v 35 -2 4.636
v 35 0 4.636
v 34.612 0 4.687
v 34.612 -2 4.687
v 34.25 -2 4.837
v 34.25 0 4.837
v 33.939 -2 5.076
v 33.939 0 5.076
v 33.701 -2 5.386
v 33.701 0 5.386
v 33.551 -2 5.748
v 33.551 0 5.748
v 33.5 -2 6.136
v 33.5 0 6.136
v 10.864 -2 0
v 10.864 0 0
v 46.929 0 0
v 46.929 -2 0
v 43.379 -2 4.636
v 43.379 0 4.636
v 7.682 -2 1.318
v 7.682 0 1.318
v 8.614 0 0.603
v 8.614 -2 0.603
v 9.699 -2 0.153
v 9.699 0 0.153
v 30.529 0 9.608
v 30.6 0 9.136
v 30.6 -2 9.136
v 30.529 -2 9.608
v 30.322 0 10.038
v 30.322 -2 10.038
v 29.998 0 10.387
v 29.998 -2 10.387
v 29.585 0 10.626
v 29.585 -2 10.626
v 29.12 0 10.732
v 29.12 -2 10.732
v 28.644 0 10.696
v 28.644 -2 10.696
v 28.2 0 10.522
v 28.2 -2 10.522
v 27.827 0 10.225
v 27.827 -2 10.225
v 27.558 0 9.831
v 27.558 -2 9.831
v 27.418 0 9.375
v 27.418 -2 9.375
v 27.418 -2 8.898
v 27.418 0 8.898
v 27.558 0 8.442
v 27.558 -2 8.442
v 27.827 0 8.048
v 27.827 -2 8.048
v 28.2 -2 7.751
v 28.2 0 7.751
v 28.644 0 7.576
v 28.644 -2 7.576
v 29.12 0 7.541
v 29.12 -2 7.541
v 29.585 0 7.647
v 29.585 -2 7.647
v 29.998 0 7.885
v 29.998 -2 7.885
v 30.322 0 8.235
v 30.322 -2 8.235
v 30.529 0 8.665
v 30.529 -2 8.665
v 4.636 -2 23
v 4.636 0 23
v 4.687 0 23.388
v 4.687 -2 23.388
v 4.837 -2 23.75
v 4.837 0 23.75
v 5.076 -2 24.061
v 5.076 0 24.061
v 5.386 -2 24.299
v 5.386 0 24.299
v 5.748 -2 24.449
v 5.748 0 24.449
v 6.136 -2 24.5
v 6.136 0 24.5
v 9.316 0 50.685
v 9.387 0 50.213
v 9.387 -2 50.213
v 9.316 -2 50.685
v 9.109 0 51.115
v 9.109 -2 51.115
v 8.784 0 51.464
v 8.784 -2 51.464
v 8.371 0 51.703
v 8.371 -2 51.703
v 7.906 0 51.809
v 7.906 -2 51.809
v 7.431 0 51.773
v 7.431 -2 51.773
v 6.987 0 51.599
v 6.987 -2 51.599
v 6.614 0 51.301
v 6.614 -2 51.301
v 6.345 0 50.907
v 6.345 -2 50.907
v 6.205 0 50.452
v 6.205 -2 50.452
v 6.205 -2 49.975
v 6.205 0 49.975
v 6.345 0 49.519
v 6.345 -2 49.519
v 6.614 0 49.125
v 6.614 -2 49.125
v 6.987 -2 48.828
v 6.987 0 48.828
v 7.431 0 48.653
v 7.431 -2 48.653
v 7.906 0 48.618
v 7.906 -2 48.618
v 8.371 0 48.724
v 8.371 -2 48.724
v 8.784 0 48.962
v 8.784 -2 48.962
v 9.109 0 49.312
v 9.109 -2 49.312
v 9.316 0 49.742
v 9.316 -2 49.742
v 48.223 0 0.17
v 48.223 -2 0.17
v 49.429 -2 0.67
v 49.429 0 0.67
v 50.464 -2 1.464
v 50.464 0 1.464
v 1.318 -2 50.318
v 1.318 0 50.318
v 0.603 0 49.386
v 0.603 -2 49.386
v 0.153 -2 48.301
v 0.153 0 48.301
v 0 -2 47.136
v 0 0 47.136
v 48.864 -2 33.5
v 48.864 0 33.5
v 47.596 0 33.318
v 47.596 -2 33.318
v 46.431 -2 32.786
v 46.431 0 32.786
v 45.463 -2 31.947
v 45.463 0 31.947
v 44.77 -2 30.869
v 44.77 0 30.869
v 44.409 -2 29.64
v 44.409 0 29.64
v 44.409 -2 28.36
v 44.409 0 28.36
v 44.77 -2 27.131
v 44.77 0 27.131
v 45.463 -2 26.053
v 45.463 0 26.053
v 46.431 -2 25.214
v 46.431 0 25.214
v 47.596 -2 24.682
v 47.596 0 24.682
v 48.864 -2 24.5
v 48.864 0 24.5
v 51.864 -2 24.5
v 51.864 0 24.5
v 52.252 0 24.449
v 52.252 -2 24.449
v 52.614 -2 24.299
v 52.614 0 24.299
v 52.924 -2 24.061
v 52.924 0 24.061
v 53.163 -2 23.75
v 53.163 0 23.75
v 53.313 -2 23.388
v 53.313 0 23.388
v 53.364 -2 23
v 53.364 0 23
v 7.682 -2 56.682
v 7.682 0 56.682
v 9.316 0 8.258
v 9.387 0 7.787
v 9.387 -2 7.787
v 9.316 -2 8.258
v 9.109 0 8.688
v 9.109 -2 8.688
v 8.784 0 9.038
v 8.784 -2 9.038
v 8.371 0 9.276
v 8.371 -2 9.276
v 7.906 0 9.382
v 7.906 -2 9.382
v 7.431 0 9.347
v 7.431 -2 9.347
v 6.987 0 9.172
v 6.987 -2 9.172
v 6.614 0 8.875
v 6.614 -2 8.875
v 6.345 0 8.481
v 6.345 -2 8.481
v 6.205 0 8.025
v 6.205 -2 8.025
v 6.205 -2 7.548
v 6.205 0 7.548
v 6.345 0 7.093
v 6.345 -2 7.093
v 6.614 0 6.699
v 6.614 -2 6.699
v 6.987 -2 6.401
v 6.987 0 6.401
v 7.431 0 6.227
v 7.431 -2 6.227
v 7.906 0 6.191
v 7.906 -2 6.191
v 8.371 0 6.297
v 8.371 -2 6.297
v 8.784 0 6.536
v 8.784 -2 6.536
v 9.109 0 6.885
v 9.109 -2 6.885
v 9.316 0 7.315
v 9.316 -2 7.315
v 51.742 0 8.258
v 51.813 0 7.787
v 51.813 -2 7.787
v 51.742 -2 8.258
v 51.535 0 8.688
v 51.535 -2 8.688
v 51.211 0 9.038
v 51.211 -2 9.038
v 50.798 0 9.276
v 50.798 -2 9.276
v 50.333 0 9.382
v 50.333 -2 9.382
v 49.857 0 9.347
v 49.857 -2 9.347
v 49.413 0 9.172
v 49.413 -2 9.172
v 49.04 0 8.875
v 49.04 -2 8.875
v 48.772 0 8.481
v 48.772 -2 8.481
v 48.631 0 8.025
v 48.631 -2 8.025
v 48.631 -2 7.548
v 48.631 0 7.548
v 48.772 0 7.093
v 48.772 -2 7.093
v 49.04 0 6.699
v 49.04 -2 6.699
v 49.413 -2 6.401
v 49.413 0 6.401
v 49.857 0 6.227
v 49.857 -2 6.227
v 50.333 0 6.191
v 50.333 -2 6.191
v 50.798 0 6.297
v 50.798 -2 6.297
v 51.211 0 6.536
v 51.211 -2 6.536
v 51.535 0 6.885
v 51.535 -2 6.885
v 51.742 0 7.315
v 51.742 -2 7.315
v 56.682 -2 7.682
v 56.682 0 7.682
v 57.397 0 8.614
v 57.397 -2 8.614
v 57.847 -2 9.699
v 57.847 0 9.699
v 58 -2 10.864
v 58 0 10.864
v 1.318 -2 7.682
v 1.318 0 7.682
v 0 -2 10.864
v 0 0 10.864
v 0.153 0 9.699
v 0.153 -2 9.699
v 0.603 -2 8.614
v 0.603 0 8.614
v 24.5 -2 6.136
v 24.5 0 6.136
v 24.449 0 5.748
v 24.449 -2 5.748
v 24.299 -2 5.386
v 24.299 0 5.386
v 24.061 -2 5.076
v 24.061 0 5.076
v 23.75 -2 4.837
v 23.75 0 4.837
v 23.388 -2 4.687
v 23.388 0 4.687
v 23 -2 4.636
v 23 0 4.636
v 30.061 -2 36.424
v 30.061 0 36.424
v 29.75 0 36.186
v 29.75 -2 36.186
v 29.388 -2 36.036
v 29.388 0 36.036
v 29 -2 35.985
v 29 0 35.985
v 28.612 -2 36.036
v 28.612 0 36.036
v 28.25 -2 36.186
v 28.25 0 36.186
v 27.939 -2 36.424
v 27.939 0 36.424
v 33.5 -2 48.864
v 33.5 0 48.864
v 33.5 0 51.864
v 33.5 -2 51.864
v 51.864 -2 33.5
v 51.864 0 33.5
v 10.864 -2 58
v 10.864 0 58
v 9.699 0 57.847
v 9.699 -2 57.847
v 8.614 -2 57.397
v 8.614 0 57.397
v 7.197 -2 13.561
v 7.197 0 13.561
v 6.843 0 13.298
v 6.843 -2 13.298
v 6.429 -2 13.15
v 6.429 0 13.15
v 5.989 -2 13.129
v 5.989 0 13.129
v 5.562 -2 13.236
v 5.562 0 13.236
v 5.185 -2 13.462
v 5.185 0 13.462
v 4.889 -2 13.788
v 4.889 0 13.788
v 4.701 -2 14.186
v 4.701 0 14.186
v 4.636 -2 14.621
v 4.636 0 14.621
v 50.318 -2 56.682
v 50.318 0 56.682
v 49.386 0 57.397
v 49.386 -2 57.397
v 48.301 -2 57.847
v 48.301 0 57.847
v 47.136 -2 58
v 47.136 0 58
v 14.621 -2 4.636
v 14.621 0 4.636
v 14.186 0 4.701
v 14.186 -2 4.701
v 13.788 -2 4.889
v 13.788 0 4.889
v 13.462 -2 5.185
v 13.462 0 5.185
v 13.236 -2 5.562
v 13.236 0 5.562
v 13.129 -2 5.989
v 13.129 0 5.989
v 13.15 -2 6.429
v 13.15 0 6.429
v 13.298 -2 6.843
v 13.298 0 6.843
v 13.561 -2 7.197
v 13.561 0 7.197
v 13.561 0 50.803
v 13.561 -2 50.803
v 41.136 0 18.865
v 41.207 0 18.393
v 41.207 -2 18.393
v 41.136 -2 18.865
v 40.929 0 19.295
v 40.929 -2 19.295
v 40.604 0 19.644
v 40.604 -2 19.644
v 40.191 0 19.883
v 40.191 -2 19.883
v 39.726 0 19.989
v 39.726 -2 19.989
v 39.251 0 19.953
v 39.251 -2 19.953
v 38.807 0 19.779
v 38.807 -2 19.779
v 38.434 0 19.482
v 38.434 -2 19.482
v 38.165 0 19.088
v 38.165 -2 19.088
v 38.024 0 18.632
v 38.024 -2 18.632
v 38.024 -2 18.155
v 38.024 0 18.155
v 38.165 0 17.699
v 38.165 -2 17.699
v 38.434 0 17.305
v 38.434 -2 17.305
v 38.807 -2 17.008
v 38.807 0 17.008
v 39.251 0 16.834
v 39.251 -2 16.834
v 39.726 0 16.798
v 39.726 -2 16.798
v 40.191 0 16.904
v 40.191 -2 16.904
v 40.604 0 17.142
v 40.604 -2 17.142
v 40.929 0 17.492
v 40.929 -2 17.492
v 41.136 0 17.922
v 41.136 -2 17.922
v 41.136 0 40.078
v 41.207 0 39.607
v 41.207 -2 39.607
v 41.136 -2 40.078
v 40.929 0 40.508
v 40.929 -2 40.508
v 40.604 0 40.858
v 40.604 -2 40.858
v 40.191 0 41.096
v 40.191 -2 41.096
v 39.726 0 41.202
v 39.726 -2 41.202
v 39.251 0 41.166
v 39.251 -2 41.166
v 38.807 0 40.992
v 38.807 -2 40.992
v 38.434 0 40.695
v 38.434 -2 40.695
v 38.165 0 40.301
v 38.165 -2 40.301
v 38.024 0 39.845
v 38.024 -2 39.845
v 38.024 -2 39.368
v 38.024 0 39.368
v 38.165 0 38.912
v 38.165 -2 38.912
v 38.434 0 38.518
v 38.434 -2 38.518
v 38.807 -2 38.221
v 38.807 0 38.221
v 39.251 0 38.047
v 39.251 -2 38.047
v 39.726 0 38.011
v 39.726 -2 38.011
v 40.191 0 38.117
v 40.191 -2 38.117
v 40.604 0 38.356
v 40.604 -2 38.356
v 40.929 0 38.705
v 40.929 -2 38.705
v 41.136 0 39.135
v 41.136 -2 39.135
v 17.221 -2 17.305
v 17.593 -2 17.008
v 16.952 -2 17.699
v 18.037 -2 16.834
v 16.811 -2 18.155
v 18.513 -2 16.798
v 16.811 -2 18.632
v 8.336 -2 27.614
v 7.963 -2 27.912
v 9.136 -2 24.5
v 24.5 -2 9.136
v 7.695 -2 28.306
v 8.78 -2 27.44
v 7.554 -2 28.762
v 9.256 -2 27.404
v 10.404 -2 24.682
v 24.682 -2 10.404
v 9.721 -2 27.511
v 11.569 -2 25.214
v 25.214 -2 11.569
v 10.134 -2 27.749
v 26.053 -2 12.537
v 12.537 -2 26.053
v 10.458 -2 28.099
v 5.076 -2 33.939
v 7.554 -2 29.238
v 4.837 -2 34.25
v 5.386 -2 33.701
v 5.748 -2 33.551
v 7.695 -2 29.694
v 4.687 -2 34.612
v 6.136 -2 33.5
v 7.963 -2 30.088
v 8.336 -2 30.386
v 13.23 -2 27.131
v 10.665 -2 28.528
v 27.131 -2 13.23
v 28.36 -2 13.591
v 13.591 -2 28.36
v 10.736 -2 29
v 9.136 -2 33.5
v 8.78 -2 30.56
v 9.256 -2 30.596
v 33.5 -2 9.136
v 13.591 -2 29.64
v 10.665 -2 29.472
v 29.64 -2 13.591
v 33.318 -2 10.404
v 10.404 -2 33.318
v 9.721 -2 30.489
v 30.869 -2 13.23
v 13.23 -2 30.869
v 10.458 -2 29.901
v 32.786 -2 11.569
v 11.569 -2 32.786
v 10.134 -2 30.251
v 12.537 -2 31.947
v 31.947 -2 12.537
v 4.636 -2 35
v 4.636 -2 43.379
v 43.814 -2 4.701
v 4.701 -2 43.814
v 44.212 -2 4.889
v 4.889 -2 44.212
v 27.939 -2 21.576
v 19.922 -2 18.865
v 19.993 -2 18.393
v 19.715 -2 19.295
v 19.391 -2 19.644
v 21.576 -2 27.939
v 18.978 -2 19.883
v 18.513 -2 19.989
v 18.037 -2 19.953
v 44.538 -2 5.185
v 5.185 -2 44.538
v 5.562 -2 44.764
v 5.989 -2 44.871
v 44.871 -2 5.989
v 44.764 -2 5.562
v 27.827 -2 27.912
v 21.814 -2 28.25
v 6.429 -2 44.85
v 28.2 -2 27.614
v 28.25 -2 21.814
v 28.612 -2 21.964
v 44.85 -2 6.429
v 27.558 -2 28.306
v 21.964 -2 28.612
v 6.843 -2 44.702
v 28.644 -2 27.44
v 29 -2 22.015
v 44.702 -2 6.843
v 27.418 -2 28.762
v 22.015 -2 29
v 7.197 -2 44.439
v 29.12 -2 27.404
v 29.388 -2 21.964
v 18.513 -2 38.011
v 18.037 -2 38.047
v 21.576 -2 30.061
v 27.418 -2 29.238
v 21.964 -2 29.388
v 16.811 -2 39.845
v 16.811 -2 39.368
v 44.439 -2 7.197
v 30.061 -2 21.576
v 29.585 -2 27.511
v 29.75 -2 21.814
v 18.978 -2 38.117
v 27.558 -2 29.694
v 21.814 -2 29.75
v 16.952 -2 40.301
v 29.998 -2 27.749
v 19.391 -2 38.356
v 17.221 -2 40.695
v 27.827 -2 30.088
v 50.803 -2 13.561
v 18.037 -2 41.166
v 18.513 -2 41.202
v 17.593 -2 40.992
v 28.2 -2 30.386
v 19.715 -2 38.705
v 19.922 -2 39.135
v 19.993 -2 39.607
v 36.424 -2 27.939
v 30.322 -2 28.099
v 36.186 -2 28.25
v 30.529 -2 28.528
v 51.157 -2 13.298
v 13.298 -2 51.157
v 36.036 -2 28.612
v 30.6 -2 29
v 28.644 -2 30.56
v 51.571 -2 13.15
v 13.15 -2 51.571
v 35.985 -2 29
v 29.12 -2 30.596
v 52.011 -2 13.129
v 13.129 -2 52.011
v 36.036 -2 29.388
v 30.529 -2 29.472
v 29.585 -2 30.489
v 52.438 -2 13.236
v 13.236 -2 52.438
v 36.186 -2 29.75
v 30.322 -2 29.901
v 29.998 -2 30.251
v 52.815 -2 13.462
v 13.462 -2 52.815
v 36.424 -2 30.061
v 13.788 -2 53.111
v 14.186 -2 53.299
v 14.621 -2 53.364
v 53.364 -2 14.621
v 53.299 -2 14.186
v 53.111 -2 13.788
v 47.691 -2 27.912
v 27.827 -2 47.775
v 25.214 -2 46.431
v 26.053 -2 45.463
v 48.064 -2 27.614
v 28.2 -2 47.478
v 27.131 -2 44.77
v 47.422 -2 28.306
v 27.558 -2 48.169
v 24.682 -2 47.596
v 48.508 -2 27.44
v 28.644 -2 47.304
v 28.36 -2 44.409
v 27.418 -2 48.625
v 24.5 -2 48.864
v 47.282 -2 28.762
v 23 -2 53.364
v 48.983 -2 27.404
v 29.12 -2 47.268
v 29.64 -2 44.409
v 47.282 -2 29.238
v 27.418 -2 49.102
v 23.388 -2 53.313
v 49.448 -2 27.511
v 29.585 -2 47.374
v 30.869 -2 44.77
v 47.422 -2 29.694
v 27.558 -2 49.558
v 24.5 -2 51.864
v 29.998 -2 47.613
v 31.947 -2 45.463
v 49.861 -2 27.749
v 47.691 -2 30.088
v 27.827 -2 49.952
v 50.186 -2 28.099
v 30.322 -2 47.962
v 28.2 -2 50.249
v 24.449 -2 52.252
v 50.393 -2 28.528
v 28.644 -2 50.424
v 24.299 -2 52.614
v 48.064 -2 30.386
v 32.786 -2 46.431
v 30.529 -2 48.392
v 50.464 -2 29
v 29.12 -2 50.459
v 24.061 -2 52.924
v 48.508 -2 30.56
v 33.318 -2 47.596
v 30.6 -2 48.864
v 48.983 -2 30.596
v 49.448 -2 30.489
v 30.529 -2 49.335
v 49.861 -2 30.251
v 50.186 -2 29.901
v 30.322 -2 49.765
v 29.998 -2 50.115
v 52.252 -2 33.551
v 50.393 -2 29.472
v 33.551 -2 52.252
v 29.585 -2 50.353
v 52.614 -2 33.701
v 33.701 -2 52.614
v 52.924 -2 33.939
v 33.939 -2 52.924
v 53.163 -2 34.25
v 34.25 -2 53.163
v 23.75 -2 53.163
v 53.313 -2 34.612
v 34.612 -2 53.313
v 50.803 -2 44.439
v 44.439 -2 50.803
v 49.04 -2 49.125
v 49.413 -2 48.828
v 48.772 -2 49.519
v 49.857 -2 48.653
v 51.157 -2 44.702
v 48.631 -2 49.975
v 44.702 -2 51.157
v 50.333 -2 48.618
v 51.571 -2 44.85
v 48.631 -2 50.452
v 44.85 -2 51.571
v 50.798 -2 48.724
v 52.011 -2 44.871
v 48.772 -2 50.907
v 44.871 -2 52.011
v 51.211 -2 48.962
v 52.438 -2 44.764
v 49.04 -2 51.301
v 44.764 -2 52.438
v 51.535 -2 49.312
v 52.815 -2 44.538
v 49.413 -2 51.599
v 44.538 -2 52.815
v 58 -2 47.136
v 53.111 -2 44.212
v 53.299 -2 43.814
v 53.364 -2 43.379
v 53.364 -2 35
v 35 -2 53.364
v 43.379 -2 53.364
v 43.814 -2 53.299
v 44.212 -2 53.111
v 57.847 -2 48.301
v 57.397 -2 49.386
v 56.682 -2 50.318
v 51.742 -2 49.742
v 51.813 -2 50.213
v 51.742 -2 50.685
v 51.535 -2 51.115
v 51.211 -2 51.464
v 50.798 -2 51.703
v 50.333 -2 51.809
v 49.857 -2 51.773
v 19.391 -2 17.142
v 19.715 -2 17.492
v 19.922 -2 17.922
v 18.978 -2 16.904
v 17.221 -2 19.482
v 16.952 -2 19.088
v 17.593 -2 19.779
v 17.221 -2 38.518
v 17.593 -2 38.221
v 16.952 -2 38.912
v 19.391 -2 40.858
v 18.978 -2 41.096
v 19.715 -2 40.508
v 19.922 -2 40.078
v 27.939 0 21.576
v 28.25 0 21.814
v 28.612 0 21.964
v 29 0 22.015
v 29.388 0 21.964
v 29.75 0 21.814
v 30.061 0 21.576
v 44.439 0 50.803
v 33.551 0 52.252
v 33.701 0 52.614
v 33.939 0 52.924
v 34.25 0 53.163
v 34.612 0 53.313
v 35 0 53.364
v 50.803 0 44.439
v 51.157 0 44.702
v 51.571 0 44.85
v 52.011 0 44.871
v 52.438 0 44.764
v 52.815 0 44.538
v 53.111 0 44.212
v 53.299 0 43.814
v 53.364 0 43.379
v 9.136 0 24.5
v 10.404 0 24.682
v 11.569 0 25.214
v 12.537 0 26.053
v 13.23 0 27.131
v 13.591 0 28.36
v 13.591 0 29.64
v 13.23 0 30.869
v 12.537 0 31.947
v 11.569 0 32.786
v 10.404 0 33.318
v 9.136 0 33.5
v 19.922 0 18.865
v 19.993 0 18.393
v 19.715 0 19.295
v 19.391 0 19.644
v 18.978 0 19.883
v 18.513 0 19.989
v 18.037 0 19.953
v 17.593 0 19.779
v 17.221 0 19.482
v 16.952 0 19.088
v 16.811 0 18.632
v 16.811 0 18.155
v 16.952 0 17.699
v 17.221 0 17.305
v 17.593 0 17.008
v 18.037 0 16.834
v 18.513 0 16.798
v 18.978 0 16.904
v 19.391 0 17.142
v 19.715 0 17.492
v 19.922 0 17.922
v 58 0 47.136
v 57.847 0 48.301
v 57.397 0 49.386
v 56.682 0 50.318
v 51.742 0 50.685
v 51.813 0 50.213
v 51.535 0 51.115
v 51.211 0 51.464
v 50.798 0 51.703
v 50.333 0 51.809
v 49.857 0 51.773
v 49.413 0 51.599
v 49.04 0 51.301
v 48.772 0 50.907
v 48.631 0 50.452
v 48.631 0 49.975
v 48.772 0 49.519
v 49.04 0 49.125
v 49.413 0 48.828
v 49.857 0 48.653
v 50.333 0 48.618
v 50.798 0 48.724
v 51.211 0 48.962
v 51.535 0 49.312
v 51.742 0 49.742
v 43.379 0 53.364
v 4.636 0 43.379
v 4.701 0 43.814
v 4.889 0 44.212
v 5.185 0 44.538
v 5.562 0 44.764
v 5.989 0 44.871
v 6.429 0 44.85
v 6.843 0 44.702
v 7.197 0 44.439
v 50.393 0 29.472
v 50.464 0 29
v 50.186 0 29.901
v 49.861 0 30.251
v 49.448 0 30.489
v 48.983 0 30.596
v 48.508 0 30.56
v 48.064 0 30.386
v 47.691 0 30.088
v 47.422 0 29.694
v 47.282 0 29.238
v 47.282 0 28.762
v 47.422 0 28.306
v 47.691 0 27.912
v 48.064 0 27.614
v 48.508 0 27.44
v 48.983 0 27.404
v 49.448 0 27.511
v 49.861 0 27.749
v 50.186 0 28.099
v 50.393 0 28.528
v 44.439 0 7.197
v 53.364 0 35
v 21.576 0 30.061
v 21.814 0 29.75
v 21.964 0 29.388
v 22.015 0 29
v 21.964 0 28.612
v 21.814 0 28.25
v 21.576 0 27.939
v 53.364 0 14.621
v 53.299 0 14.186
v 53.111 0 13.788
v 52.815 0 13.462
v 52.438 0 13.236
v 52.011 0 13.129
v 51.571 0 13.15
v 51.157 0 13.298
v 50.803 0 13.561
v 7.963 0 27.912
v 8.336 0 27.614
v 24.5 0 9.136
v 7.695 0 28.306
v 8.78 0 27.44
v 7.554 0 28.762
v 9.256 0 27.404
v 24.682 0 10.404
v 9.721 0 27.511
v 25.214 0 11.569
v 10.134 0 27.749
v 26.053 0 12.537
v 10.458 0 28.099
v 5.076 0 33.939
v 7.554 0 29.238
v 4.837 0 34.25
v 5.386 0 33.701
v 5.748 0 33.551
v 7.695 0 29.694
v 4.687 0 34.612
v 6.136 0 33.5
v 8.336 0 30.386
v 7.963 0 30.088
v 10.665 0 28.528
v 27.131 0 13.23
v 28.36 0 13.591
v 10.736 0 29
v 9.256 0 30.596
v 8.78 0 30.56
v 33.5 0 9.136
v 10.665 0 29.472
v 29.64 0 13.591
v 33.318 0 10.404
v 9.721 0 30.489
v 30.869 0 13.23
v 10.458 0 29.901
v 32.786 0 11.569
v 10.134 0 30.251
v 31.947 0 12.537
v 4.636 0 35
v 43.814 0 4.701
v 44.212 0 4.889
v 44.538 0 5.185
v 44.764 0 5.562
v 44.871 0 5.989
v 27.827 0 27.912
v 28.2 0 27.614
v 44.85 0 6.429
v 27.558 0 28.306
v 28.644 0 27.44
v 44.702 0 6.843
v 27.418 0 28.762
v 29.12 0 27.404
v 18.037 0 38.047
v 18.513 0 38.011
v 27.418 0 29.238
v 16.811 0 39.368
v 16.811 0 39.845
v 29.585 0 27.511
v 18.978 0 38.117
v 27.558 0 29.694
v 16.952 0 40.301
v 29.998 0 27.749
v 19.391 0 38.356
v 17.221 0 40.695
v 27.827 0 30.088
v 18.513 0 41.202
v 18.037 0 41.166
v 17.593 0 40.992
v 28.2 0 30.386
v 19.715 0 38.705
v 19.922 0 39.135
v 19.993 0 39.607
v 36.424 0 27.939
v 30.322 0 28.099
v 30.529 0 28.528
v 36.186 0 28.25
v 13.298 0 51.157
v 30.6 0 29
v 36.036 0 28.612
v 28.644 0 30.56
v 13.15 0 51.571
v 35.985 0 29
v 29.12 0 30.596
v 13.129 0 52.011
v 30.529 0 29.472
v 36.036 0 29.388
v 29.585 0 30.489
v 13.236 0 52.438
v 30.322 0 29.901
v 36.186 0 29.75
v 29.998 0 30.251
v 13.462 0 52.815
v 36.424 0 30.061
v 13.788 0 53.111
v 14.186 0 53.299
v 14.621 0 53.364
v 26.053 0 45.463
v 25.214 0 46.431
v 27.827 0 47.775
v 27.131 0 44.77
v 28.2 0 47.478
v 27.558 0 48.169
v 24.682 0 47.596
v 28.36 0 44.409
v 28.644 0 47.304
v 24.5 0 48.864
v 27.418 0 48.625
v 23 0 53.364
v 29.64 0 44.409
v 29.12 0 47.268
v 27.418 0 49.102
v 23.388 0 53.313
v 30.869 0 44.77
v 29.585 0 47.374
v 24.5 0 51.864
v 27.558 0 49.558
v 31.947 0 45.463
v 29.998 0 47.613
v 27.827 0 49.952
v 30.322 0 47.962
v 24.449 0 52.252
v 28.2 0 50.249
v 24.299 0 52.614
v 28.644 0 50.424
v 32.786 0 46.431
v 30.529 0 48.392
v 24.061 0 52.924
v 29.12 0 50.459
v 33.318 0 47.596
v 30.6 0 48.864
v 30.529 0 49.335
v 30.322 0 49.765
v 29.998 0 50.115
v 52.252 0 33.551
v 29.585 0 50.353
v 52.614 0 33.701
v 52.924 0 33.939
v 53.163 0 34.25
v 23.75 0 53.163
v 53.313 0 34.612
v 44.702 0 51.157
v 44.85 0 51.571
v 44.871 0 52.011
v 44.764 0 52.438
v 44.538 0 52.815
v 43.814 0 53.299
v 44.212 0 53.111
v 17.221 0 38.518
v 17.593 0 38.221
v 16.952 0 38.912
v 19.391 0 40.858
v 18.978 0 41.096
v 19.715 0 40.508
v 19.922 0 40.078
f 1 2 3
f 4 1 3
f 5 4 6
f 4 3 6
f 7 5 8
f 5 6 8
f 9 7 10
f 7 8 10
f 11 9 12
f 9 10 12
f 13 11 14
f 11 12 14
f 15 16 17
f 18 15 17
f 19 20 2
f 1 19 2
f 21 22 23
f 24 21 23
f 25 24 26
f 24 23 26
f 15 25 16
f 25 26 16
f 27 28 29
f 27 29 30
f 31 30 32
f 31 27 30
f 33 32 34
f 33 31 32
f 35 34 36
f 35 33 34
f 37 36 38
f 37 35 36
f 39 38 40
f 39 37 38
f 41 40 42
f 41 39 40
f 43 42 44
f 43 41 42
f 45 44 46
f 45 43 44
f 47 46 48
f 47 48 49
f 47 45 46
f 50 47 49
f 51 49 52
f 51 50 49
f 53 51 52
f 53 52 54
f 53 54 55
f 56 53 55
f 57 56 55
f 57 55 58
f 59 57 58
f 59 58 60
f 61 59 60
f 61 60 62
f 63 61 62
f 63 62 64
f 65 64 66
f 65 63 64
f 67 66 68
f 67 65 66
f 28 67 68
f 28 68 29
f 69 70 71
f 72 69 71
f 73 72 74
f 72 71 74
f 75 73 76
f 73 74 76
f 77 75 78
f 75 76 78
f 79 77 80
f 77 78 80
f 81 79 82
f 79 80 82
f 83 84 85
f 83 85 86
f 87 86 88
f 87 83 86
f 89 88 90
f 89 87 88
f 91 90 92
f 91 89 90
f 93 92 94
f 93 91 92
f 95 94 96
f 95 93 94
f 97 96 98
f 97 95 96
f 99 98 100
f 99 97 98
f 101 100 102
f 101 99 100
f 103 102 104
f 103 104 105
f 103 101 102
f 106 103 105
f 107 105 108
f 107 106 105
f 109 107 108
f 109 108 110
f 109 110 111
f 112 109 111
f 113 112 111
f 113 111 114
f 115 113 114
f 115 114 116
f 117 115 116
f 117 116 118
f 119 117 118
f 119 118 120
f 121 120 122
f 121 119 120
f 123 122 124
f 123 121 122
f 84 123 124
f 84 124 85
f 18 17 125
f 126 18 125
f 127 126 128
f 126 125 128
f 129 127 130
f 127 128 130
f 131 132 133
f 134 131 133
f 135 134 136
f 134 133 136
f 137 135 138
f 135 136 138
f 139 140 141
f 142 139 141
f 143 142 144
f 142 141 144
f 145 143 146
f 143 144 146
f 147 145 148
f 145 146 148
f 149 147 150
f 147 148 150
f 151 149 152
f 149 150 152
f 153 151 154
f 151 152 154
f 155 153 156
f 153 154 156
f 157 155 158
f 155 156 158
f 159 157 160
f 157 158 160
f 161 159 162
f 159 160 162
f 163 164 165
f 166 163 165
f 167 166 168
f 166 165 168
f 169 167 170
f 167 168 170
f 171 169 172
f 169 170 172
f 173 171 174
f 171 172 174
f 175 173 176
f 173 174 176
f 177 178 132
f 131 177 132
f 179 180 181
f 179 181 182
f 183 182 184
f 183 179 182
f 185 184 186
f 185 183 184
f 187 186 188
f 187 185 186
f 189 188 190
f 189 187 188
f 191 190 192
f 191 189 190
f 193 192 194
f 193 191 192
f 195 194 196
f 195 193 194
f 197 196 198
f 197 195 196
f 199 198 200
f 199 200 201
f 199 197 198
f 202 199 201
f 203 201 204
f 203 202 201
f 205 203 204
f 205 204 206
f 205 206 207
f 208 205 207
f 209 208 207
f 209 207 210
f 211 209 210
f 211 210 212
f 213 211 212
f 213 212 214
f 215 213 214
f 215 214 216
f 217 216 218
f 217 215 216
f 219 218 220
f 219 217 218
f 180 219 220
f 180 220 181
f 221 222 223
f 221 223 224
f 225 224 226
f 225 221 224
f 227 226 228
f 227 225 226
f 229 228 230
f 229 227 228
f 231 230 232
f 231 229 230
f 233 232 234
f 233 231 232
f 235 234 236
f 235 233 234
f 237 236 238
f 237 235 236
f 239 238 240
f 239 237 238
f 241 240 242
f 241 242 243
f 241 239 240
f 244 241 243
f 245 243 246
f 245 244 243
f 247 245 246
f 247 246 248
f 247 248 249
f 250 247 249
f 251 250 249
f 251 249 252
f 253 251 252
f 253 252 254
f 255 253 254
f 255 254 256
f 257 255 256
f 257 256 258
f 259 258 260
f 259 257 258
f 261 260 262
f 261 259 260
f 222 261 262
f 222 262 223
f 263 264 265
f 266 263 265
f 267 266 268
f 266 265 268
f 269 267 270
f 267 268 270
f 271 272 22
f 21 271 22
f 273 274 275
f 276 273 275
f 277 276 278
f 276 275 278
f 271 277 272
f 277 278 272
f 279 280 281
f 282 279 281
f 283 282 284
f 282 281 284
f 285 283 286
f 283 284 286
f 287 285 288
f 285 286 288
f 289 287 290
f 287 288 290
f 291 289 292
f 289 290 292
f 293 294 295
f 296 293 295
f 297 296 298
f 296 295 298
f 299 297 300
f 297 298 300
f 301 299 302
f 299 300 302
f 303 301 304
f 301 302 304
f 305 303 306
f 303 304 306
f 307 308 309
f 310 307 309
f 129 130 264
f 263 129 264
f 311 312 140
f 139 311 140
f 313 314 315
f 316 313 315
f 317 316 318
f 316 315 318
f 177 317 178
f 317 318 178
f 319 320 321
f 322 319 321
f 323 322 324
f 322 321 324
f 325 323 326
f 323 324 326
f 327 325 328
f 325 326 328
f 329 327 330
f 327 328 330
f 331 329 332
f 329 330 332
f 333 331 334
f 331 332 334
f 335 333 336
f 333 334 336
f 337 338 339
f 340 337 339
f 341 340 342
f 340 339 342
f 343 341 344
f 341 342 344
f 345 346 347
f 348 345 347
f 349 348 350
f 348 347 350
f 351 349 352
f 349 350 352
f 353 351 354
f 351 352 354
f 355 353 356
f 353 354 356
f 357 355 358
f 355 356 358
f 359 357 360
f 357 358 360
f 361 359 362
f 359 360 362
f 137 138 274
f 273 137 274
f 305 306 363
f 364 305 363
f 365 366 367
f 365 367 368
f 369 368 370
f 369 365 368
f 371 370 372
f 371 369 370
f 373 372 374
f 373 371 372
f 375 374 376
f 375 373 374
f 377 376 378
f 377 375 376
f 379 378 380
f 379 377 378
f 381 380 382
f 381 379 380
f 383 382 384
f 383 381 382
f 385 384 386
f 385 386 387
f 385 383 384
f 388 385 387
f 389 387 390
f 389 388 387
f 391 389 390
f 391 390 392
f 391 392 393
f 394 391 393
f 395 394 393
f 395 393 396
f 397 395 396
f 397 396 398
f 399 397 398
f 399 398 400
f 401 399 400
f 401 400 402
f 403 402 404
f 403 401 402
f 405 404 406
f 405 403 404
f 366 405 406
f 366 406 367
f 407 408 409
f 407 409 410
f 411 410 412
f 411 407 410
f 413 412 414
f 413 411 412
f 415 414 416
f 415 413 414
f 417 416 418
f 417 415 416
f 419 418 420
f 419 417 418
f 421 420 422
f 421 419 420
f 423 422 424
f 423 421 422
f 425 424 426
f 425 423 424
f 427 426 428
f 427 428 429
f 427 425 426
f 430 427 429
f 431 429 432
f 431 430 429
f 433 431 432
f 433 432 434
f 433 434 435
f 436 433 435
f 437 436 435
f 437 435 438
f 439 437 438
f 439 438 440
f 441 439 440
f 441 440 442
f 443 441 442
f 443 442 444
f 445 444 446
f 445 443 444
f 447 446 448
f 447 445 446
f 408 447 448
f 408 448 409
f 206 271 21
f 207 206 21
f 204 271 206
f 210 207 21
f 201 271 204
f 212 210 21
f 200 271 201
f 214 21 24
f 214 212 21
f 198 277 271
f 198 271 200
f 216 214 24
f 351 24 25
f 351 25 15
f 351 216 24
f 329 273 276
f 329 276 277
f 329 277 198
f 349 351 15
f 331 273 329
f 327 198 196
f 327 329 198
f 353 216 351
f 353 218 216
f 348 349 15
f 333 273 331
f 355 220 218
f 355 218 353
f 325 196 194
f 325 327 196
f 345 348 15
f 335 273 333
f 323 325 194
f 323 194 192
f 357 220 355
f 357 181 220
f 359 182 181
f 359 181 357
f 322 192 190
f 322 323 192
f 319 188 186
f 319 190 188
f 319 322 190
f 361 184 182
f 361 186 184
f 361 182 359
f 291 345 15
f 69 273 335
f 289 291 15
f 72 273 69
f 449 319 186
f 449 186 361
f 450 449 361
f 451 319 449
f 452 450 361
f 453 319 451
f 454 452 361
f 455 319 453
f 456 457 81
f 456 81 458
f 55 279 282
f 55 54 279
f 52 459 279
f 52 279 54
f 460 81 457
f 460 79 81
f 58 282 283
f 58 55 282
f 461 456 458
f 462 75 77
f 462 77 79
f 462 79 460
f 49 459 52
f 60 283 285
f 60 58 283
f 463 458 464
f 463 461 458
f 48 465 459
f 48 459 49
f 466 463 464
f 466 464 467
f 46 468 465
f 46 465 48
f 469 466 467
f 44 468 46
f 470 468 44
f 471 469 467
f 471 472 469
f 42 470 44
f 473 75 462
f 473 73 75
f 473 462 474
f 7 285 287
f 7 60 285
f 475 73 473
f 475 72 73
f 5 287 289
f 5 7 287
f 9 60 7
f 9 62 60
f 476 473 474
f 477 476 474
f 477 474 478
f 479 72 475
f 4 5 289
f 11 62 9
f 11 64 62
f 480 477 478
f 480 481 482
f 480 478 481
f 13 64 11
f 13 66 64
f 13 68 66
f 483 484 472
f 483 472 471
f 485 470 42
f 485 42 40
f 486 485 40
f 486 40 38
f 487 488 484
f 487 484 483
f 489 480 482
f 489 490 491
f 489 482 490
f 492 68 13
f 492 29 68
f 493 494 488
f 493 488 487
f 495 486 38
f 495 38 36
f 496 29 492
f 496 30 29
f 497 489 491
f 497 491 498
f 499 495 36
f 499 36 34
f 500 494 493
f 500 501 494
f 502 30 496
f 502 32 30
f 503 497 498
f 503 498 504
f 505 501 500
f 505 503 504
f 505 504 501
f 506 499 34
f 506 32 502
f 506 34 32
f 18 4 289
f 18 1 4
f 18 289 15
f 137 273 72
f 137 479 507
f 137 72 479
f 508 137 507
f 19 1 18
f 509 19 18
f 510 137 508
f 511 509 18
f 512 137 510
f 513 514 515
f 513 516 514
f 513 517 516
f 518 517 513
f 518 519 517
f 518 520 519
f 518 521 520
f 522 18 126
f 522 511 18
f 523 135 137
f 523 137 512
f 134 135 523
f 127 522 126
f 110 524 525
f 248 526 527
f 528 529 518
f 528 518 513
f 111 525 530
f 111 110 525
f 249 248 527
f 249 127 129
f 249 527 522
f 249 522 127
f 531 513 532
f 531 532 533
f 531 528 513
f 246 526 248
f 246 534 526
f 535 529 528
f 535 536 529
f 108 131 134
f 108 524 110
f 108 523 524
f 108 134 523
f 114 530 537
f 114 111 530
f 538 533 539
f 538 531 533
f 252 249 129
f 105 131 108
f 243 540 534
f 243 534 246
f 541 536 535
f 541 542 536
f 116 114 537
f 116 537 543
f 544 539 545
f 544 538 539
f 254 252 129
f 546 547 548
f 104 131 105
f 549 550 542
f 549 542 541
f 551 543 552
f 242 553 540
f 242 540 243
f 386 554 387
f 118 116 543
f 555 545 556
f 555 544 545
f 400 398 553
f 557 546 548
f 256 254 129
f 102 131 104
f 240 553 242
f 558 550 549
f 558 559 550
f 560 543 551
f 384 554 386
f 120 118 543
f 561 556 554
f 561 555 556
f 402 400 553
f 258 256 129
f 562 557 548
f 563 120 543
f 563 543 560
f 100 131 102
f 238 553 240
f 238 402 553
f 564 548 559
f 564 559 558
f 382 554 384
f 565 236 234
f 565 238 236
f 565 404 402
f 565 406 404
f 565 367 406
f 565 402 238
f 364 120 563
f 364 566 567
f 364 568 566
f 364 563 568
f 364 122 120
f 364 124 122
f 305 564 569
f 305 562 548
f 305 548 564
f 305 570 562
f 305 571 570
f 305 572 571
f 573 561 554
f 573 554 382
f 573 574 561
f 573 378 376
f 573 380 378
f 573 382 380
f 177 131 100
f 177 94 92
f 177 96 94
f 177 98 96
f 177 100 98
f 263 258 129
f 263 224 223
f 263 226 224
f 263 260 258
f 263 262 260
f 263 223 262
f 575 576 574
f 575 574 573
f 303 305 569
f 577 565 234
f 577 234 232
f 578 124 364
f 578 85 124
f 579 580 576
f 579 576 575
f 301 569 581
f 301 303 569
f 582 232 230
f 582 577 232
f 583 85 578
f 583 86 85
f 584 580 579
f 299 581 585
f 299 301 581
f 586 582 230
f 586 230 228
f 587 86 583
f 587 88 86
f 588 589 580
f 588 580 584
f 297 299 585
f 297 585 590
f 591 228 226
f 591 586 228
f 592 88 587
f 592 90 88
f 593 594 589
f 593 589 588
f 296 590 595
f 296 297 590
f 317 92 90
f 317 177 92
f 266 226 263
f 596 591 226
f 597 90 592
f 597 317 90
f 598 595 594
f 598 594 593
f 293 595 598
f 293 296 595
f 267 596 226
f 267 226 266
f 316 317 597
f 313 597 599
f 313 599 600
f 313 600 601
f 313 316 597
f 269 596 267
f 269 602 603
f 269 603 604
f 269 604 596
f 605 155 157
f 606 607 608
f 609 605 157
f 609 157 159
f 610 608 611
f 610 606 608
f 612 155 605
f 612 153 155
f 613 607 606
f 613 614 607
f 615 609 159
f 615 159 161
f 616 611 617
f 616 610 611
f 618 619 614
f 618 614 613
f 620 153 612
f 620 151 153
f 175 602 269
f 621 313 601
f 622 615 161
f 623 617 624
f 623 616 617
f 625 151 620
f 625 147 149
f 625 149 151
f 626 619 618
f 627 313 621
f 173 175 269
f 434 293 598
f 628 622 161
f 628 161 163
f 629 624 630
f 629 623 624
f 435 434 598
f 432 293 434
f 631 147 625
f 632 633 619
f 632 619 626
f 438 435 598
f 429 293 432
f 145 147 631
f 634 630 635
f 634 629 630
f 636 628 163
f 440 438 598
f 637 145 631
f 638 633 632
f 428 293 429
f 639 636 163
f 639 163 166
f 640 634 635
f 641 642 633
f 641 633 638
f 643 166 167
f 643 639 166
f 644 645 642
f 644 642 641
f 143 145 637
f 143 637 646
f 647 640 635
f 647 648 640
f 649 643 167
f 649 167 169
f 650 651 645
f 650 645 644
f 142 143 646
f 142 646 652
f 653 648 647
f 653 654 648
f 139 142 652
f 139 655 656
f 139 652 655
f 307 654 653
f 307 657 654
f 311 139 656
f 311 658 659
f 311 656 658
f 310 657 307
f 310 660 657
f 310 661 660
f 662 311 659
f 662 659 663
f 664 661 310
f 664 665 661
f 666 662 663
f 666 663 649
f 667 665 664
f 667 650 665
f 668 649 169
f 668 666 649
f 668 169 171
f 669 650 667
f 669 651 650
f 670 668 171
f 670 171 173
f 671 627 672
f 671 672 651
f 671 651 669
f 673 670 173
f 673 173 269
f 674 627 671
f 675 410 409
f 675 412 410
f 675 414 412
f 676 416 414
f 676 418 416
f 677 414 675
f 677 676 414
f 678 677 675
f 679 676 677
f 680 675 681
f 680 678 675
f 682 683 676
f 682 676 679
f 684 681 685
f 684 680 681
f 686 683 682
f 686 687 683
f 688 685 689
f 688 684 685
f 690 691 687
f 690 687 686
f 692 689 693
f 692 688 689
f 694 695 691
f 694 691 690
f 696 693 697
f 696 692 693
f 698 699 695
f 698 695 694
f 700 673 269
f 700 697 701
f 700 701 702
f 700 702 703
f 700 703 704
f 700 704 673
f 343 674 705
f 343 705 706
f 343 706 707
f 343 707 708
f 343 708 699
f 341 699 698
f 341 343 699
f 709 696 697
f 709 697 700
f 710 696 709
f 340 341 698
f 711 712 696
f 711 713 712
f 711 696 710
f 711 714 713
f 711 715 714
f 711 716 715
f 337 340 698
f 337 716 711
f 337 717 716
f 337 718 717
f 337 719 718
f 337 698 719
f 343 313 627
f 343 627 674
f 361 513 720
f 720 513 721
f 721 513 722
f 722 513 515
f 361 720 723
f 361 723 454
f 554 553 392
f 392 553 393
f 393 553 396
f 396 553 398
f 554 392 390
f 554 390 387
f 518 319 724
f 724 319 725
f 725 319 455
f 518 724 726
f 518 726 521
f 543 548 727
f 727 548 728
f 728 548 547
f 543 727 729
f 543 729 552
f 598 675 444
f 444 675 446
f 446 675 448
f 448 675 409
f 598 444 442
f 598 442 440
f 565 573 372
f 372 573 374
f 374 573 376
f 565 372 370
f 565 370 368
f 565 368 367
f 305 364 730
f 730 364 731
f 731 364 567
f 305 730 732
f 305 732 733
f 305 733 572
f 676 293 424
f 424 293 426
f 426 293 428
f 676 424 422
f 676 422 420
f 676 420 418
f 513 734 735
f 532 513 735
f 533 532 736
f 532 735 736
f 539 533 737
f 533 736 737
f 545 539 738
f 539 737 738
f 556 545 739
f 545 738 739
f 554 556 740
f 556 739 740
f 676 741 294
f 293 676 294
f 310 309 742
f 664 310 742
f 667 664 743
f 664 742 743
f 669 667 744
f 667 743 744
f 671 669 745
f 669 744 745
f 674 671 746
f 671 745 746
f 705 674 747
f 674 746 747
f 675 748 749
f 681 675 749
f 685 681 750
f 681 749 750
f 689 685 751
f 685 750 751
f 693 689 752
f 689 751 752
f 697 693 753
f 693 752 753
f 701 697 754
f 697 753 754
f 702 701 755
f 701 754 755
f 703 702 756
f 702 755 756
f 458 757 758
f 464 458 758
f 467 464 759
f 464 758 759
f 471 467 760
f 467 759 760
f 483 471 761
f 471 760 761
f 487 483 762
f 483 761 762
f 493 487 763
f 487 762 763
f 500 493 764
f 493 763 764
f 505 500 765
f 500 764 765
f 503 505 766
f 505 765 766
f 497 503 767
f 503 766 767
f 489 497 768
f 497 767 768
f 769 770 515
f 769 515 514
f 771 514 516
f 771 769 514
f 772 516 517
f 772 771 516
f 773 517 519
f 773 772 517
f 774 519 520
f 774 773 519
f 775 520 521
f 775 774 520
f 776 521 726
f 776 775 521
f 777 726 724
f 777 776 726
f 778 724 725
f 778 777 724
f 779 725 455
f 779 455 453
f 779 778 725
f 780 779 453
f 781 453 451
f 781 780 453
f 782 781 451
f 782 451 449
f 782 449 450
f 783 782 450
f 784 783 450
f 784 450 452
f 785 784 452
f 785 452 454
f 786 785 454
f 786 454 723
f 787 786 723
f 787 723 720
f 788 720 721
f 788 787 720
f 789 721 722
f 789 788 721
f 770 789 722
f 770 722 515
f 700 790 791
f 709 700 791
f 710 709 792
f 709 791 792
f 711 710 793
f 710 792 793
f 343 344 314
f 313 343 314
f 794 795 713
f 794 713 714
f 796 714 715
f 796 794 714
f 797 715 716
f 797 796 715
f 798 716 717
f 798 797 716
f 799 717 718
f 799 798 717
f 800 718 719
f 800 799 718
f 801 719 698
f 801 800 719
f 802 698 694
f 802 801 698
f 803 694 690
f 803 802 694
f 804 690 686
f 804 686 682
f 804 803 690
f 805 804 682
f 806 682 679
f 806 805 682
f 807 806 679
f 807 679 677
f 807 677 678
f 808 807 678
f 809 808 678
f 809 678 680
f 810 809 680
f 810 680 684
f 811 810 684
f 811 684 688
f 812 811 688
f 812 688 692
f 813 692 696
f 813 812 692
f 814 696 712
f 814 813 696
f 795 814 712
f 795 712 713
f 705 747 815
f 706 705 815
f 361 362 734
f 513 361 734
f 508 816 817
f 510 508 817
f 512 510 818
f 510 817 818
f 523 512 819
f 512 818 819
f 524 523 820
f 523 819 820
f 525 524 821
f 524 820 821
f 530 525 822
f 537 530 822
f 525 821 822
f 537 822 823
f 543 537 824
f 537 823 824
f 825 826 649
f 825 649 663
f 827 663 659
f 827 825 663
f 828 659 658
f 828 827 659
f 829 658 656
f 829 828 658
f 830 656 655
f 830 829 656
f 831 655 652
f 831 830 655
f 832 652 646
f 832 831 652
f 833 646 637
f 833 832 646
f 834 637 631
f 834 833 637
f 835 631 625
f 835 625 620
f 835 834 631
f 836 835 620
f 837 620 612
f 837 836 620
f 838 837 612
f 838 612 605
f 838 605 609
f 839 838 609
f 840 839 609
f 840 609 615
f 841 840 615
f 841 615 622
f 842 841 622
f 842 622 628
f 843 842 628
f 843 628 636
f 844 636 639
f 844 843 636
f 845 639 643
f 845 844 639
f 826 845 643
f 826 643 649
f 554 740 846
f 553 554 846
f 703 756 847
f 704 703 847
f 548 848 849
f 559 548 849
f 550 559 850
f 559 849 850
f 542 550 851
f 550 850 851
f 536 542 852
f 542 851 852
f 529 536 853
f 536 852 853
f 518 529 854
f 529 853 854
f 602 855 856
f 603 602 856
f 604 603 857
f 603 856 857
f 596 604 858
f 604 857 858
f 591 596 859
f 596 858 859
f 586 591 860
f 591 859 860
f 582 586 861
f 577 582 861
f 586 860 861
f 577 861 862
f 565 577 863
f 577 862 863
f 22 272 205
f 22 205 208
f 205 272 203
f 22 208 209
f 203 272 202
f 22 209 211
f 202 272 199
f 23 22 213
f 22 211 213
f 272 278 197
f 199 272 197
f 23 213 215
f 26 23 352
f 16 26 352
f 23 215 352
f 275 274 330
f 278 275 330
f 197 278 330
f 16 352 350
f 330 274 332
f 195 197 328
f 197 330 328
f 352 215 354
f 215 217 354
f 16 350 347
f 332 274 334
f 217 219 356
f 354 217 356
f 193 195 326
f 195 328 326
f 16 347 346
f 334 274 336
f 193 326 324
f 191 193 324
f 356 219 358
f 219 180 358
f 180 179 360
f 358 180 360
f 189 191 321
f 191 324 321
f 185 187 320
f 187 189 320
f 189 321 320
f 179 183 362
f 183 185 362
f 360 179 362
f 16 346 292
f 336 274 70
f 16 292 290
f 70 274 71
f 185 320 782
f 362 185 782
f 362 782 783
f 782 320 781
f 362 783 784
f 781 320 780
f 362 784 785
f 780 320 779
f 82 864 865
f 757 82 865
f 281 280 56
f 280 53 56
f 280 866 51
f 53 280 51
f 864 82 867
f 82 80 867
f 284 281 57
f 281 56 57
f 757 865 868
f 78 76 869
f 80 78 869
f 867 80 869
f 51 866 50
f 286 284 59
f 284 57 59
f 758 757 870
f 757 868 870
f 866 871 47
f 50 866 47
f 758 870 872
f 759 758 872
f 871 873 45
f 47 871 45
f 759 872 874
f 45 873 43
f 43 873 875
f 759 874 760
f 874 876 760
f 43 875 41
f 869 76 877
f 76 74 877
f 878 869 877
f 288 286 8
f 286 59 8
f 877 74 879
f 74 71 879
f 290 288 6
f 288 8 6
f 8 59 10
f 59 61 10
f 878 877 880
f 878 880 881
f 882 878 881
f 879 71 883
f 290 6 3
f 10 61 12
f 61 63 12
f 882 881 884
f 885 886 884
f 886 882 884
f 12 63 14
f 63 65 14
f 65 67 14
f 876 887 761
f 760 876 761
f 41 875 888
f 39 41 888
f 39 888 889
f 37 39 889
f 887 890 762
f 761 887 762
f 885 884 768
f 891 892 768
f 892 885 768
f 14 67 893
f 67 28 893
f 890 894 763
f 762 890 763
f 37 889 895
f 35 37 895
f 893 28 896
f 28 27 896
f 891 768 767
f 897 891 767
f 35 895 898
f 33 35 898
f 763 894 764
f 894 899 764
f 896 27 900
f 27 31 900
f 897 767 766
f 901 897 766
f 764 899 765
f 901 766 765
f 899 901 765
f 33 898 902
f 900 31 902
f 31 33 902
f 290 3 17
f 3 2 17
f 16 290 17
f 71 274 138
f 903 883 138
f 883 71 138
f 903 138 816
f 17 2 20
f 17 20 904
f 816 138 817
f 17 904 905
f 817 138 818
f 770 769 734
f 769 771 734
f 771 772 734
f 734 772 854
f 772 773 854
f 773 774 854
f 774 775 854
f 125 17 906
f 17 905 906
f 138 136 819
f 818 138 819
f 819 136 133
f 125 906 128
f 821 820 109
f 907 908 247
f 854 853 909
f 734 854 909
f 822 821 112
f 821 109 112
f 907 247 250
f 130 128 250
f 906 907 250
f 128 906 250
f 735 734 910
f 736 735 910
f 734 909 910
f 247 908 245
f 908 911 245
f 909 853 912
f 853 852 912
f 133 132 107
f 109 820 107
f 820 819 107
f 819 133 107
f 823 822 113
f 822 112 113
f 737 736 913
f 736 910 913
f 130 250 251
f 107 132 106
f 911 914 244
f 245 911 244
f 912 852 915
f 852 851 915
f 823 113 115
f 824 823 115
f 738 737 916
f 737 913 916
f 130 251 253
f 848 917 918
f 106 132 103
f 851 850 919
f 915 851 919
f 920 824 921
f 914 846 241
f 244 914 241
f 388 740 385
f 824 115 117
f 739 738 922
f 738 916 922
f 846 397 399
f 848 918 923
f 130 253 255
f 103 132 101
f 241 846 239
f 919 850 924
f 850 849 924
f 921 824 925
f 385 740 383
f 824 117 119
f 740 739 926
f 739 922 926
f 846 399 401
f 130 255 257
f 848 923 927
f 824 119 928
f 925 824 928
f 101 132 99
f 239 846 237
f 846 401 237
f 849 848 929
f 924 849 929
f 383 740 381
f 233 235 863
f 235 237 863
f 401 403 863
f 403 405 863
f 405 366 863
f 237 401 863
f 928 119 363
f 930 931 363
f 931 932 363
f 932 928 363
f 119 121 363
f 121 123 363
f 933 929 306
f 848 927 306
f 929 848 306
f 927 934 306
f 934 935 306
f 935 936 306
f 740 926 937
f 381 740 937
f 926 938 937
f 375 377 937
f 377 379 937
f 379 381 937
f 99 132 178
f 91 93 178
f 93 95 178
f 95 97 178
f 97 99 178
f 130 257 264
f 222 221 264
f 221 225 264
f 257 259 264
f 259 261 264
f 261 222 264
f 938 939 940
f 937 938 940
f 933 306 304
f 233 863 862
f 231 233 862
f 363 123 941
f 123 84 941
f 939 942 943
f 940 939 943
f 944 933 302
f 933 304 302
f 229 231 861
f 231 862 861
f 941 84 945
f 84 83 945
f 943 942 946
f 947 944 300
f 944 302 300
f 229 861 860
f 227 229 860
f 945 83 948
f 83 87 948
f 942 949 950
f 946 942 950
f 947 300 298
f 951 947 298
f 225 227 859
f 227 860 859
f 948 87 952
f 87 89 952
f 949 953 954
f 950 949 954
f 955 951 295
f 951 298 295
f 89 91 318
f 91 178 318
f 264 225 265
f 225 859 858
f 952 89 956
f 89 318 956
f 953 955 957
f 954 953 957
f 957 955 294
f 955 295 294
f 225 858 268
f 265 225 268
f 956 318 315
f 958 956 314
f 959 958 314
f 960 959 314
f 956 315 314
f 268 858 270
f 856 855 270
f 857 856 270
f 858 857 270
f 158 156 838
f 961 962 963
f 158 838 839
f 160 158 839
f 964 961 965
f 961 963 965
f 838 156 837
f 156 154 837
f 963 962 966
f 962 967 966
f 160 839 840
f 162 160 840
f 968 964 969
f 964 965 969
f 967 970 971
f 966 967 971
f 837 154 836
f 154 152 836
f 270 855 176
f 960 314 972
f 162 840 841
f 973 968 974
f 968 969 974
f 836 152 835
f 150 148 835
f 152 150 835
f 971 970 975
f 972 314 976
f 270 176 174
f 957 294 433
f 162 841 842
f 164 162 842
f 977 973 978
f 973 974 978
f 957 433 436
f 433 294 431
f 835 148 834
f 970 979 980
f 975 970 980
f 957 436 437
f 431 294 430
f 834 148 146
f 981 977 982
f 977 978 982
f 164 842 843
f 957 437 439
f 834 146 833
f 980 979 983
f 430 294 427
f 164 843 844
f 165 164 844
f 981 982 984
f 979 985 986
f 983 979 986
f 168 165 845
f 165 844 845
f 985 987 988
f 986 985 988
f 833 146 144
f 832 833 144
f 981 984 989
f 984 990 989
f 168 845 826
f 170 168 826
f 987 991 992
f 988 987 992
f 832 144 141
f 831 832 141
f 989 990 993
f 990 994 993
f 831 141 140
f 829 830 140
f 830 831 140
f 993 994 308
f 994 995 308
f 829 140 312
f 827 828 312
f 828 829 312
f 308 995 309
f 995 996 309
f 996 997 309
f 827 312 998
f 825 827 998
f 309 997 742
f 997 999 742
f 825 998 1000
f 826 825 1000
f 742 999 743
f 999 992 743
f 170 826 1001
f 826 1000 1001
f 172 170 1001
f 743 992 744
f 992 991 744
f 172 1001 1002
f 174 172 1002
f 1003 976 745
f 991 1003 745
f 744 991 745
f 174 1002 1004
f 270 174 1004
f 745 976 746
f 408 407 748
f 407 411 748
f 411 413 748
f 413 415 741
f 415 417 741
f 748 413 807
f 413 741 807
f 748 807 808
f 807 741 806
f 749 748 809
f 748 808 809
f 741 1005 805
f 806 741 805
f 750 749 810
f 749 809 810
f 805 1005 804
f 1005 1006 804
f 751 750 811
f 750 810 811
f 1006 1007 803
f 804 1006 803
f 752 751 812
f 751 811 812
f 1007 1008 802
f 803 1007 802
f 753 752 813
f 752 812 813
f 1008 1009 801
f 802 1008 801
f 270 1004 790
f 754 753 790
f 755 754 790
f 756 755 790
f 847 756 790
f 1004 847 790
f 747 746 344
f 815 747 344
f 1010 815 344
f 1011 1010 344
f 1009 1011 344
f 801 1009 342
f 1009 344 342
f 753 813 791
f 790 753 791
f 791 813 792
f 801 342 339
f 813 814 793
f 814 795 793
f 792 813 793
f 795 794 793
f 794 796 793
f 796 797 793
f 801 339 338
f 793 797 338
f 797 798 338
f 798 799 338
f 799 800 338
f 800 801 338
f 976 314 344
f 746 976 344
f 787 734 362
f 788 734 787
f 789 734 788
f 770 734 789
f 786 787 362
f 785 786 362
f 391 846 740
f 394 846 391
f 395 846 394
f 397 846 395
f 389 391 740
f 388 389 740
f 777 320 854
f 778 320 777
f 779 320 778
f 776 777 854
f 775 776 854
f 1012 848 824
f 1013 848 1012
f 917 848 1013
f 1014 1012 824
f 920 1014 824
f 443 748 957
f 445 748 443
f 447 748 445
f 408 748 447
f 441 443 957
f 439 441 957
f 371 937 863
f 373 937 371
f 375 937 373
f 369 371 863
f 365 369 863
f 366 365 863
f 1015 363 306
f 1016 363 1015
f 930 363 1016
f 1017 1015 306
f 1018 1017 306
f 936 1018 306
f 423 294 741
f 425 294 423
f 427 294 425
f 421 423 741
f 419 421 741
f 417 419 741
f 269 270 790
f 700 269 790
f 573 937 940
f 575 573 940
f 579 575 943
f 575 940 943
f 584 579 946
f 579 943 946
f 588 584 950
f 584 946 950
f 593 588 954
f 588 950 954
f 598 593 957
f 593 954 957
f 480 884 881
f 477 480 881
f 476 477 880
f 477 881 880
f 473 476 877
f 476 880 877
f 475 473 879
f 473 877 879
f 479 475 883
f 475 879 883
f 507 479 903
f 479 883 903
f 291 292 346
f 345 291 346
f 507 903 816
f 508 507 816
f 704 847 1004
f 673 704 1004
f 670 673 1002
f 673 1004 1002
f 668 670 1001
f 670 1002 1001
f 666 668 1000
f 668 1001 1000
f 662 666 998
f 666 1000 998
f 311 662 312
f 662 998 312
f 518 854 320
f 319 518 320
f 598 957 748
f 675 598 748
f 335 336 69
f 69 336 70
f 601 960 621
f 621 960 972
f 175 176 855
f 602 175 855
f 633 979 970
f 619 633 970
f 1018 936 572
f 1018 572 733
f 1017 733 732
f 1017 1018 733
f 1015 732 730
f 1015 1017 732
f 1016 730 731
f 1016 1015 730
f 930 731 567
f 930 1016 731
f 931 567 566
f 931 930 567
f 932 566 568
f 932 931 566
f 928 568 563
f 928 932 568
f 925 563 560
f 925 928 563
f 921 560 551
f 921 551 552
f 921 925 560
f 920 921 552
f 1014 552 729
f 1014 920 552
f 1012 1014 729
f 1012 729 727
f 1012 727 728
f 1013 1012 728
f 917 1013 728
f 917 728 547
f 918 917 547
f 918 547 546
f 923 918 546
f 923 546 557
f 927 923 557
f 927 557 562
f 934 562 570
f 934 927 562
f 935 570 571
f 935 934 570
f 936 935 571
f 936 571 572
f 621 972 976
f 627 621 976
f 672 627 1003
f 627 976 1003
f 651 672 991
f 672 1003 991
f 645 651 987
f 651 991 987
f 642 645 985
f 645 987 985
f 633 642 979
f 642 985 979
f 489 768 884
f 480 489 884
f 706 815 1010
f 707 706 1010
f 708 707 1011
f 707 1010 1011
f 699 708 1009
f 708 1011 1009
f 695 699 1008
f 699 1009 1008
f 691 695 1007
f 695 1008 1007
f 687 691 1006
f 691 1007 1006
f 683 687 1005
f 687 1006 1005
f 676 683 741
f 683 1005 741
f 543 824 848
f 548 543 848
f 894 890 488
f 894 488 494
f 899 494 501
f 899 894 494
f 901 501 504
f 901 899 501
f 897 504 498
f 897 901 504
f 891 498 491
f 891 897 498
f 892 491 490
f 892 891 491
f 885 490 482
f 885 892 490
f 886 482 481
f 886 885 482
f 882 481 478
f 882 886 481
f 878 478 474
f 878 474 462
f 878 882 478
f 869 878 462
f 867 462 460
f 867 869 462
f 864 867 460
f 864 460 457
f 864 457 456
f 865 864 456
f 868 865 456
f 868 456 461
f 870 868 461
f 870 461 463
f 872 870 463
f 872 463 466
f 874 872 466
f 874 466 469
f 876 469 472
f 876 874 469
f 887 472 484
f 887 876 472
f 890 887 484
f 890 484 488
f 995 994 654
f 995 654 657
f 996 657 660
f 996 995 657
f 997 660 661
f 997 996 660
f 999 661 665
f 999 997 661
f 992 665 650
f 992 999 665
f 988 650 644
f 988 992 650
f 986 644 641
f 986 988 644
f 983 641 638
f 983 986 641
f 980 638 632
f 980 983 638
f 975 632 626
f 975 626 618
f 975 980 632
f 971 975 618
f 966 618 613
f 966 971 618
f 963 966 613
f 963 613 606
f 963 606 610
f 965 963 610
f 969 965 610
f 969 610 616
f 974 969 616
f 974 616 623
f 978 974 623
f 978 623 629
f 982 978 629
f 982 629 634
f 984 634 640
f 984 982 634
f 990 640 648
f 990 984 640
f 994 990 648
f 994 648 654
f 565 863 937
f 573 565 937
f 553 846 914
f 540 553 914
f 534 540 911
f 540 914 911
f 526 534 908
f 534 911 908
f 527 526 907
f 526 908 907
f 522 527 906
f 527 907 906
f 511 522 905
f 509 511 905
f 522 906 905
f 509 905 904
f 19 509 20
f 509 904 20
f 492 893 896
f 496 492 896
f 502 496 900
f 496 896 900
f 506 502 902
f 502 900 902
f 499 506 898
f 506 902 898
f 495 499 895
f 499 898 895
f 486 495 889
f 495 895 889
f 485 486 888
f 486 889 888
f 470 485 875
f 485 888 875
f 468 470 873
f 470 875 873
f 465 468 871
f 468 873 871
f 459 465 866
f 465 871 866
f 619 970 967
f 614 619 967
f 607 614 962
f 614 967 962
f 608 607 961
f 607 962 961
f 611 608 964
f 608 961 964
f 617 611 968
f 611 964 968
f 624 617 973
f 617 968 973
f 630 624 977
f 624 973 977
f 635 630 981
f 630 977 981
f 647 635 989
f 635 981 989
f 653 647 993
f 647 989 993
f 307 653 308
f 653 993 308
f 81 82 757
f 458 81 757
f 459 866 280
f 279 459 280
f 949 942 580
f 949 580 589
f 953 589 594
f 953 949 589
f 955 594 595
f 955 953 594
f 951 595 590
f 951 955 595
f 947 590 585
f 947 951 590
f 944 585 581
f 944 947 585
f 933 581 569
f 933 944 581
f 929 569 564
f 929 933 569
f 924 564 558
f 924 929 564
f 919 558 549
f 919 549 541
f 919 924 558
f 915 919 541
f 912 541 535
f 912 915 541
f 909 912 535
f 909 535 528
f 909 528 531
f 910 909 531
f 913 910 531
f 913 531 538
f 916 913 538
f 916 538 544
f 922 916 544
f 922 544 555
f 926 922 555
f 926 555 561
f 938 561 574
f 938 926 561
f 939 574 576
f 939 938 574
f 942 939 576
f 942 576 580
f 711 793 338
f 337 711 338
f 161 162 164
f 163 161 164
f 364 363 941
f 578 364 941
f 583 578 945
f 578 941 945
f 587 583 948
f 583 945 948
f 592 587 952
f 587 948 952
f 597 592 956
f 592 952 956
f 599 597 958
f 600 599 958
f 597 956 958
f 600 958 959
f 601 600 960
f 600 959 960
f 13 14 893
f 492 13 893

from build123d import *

# Parameters (mm, degrees)
F1_R     = 1.6
F2_DEPTH = 2


with BuildPart() as f2:
    # F1 (on Front) → F2 (new body)
    with BuildSketch(Plane.XZ):
        with BuildLine():
            Line((47.136039, 58), (10.863961, 58))
            ThreePointArc((10.863961, 58), (9.141886, 57.657458), (7.681981, 56.681981))
            Line((7.681981, 56.681981), (1.318019, 50.318019))
            ThreePointArc((1.318019, 50.318019), (0.342542, 48.858114), (0, 47.136039))
            Line((0, 47.136039), (0, 10.863961))
            ThreePointArc((0, 10.863961), (0.342542, 9.141886), (1.318019, 7.681981))
            Line((1.318019, 7.681981), (7.681981, 1.318019))
            ThreePointArc((7.681981, 1.318019), (9.141886, 0.342542), (10.863961, 0))
            Line((10.863961, 0), (46.928932, 0))
            ThreePointArc((46.928932, 0), (48.842349, 0.380602), (50.464466, 1.464466))
            Line((50.464466, 1.464466), (56.681981, 7.681981))
            ThreePointArc((56.681981, 7.681981), (57.657458, 9.141886), (58, 10.863961))
            Line((58, 10.863961), (58, 47.136039))
            ThreePointArc((58, 47.136039), (57.657458, 48.858114), (56.681981, 50.318019))
            Line((56.681981, 50.318019), (50.318019, 56.681981))
            ThreePointArc((50.318019, 56.681981), (48.858114, 57.657458), (47.136039, 58))
        make_face()
        with Locations((7.786797, 7.786797)):
            Circle(F1_R, mode=Mode.SUBTRACT)
        with BuildLine():
            ThreePointArc((7.197009, 13.56066), (5.562323, 13.235501), (4.636348, 14.62132))
            Line((4.636348, 14.62132), (4.636348, 23))
            ThreePointArc((4.636348, 23), (5.075688, 24.06066), (6.136348, 24.5))
            Line((6.136348, 24.5), (9.136348, 24.5))
            ThreePointArc((9.136348, 24.5), (13.636348, 29), (9.136348, 33.5))
            Line((9.136348, 33.5), (6.136348, 33.5))
            ThreePointArc((6.136348, 33.5), (5.075688, 33.93934), (4.636348, 35))
            Line((4.636348, 35), (4.636348, 43.37868))
            ThreePointArc((4.636348, 43.37868), (5.562323, 44.764499), (7.197009, 44.43934))
            Line((7.197009, 44.43934), (21.575688, 30.06066))
            ThreePointArc((21.575688, 30.06066), (22.015028, 29), (21.575688, 27.93934))
            Line((21.575688, 27.93934), (7.197009, 13.56066))
        make_face(mode=Mode.SUBTRACT)
        with Locations((18.393398, 18.393398)):
            Circle(F1_R, mode=Mode.SUBTRACT)
        with Locations((29, 9.136348)):
            Circle(F1_R, mode=Mode.SUBTRACT)
        with BuildLine():
            Line((33.5, 6.136348), (33.5, 9.136348))
            ThreePointArc((33.5, 9.136348), (29, 13.636348), (24.5, 9.136348))
            Line((24.5, 9.136348), (24.5, 6.136348))
            ThreePointArc((24.5, 6.136348), (24.06066, 5.075688), (23, 4.636348))
            Line((23, 4.636348), (14.62132, 4.636348))
            ThreePointArc((14.62132, 4.636348), (13.235501, 5.562323), (13.56066, 7.197009))
            Line((13.56066, 7.197009), (27.93934, 21.575688))
            ThreePointArc((27.93934, 21.575688), (29, 22.015028), (30.06066, 21.575688))
            Line((30.06066, 21.575688), (44.43934, 7.197009))
            ThreePointArc((44.43934, 7.197009), (44.764499, 5.562323), (43.37868, 4.636348))
            Line((43.37868, 4.636348), (35, 4.636348))
            ThreePointArc((35, 4.636348), (33.93934, 5.075688), (33.5, 6.136348))
        make_face(mode=Mode.SUBTRACT)
        with Locations((50.213203, 7.786797)):
            Circle(F1_R, mode=Mode.SUBTRACT)
        with Locations((39.606602, 18.393398)):
            Circle(F1_R, mode=Mode.SUBTRACT)
        with BuildLine():
            ThreePointArc((50.802991, 44.43934), (52.437677, 44.764499), (53.363652, 43.37868))
            Line((53.363652, 43.37868), (53.363652, 35))
            ThreePointArc((53.363652, 35), (52.924312, 33.93934), (51.863652, 33.5))
            Line((51.863652, 33.5), (48.863652, 33.5))
            ThreePointArc((48.863652, 33.5), (44.363652, 29), (48.863652, 24.5))
            Line((48.863652, 24.5), (51.863652, 24.5))
            ThreePointArc((51.863652, 24.5), (52.924312, 24.06066), (53.363652, 23))
            Line((53.363652, 23), (53.363652, 14.62132))
            ThreePointArc((53.363652, 14.62132), (52.437677, 13.235501), (50.802991, 13.56066))
            Line((50.802991, 13.56066), (36.424312, 27.93934))
            ThreePointArc((36.424312, 27.93934), (35.984972, 29), (36.424312, 30.06066))
            Line((36.424312, 30.06066), (50.802991, 44.43934))
        make_face(mode=Mode.SUBTRACT)
        with Locations((9.136348, 29)):
            Circle(F1_R, mode=Mode.SUBTRACT)
        with Locations((18.393398, 39.606602)):
            Circle(F1_R, mode=Mode.SUBTRACT)
        with Locations((7.786797, 50.213203)):
            Circle(F1_R, mode=Mode.SUBTRACT)
        with Locations((29, 29)):
            Circle(F1_R, mode=Mode.SUBTRACT)
        with Locations((39.606602, 39.606602)):
            Circle(F1_R, mode=Mode.SUBTRACT)
        with Locations((48.863652, 29)):
            Circle(F1_R, mode=Mode.SUBTRACT)
        with BuildLine():
            ThreePointArc((13.56066, 50.802991), (13.235501, 52.437677), (14.62132, 53.363652))
            Line((14.62132, 53.363652), (23, 53.363652))
            ThreePointArc((23, 53.363652), (24.06066, 52.924312), (24.5, 51.863652))
            Line((24.5, 51.863652), (24.5, 48.863652))
            ThreePointArc((24.5, 48.863652), (29, 44.363652), (33.5, 48.863652))
            Line((33.5, 48.863652), (33.5, 51.863652))
            ThreePointArc((33.5, 51.863652), (33.93934, 52.924312), (35, 53.363652))
            Line((35, 53.363652), (43.37868, 53.363652))
            ThreePointArc((43.37868, 53.363652), (44.764499, 52.437677), (44.43934, 50.802991))
            Line((44.43934, 50.802991), (30.06066, 36.424312))
            ThreePointArc((30.06066, 36.424312), (29, 35.984972), (27.93934, 36.424312))
            Line((27.93934, 36.424312), (13.56066, 50.802991))
        make_face(mode=Mode.SUBTRACT)
        with Locations((29, 48.863652)):
            Circle(F1_R, mode=Mode.SUBTRACT)
        with Locations((50.213203, 50.213203)):
            Circle(F1_R, mode=Mode.SUBTRACT)
    extrude(amount=F2_DEPTH)


solid = f2.part
